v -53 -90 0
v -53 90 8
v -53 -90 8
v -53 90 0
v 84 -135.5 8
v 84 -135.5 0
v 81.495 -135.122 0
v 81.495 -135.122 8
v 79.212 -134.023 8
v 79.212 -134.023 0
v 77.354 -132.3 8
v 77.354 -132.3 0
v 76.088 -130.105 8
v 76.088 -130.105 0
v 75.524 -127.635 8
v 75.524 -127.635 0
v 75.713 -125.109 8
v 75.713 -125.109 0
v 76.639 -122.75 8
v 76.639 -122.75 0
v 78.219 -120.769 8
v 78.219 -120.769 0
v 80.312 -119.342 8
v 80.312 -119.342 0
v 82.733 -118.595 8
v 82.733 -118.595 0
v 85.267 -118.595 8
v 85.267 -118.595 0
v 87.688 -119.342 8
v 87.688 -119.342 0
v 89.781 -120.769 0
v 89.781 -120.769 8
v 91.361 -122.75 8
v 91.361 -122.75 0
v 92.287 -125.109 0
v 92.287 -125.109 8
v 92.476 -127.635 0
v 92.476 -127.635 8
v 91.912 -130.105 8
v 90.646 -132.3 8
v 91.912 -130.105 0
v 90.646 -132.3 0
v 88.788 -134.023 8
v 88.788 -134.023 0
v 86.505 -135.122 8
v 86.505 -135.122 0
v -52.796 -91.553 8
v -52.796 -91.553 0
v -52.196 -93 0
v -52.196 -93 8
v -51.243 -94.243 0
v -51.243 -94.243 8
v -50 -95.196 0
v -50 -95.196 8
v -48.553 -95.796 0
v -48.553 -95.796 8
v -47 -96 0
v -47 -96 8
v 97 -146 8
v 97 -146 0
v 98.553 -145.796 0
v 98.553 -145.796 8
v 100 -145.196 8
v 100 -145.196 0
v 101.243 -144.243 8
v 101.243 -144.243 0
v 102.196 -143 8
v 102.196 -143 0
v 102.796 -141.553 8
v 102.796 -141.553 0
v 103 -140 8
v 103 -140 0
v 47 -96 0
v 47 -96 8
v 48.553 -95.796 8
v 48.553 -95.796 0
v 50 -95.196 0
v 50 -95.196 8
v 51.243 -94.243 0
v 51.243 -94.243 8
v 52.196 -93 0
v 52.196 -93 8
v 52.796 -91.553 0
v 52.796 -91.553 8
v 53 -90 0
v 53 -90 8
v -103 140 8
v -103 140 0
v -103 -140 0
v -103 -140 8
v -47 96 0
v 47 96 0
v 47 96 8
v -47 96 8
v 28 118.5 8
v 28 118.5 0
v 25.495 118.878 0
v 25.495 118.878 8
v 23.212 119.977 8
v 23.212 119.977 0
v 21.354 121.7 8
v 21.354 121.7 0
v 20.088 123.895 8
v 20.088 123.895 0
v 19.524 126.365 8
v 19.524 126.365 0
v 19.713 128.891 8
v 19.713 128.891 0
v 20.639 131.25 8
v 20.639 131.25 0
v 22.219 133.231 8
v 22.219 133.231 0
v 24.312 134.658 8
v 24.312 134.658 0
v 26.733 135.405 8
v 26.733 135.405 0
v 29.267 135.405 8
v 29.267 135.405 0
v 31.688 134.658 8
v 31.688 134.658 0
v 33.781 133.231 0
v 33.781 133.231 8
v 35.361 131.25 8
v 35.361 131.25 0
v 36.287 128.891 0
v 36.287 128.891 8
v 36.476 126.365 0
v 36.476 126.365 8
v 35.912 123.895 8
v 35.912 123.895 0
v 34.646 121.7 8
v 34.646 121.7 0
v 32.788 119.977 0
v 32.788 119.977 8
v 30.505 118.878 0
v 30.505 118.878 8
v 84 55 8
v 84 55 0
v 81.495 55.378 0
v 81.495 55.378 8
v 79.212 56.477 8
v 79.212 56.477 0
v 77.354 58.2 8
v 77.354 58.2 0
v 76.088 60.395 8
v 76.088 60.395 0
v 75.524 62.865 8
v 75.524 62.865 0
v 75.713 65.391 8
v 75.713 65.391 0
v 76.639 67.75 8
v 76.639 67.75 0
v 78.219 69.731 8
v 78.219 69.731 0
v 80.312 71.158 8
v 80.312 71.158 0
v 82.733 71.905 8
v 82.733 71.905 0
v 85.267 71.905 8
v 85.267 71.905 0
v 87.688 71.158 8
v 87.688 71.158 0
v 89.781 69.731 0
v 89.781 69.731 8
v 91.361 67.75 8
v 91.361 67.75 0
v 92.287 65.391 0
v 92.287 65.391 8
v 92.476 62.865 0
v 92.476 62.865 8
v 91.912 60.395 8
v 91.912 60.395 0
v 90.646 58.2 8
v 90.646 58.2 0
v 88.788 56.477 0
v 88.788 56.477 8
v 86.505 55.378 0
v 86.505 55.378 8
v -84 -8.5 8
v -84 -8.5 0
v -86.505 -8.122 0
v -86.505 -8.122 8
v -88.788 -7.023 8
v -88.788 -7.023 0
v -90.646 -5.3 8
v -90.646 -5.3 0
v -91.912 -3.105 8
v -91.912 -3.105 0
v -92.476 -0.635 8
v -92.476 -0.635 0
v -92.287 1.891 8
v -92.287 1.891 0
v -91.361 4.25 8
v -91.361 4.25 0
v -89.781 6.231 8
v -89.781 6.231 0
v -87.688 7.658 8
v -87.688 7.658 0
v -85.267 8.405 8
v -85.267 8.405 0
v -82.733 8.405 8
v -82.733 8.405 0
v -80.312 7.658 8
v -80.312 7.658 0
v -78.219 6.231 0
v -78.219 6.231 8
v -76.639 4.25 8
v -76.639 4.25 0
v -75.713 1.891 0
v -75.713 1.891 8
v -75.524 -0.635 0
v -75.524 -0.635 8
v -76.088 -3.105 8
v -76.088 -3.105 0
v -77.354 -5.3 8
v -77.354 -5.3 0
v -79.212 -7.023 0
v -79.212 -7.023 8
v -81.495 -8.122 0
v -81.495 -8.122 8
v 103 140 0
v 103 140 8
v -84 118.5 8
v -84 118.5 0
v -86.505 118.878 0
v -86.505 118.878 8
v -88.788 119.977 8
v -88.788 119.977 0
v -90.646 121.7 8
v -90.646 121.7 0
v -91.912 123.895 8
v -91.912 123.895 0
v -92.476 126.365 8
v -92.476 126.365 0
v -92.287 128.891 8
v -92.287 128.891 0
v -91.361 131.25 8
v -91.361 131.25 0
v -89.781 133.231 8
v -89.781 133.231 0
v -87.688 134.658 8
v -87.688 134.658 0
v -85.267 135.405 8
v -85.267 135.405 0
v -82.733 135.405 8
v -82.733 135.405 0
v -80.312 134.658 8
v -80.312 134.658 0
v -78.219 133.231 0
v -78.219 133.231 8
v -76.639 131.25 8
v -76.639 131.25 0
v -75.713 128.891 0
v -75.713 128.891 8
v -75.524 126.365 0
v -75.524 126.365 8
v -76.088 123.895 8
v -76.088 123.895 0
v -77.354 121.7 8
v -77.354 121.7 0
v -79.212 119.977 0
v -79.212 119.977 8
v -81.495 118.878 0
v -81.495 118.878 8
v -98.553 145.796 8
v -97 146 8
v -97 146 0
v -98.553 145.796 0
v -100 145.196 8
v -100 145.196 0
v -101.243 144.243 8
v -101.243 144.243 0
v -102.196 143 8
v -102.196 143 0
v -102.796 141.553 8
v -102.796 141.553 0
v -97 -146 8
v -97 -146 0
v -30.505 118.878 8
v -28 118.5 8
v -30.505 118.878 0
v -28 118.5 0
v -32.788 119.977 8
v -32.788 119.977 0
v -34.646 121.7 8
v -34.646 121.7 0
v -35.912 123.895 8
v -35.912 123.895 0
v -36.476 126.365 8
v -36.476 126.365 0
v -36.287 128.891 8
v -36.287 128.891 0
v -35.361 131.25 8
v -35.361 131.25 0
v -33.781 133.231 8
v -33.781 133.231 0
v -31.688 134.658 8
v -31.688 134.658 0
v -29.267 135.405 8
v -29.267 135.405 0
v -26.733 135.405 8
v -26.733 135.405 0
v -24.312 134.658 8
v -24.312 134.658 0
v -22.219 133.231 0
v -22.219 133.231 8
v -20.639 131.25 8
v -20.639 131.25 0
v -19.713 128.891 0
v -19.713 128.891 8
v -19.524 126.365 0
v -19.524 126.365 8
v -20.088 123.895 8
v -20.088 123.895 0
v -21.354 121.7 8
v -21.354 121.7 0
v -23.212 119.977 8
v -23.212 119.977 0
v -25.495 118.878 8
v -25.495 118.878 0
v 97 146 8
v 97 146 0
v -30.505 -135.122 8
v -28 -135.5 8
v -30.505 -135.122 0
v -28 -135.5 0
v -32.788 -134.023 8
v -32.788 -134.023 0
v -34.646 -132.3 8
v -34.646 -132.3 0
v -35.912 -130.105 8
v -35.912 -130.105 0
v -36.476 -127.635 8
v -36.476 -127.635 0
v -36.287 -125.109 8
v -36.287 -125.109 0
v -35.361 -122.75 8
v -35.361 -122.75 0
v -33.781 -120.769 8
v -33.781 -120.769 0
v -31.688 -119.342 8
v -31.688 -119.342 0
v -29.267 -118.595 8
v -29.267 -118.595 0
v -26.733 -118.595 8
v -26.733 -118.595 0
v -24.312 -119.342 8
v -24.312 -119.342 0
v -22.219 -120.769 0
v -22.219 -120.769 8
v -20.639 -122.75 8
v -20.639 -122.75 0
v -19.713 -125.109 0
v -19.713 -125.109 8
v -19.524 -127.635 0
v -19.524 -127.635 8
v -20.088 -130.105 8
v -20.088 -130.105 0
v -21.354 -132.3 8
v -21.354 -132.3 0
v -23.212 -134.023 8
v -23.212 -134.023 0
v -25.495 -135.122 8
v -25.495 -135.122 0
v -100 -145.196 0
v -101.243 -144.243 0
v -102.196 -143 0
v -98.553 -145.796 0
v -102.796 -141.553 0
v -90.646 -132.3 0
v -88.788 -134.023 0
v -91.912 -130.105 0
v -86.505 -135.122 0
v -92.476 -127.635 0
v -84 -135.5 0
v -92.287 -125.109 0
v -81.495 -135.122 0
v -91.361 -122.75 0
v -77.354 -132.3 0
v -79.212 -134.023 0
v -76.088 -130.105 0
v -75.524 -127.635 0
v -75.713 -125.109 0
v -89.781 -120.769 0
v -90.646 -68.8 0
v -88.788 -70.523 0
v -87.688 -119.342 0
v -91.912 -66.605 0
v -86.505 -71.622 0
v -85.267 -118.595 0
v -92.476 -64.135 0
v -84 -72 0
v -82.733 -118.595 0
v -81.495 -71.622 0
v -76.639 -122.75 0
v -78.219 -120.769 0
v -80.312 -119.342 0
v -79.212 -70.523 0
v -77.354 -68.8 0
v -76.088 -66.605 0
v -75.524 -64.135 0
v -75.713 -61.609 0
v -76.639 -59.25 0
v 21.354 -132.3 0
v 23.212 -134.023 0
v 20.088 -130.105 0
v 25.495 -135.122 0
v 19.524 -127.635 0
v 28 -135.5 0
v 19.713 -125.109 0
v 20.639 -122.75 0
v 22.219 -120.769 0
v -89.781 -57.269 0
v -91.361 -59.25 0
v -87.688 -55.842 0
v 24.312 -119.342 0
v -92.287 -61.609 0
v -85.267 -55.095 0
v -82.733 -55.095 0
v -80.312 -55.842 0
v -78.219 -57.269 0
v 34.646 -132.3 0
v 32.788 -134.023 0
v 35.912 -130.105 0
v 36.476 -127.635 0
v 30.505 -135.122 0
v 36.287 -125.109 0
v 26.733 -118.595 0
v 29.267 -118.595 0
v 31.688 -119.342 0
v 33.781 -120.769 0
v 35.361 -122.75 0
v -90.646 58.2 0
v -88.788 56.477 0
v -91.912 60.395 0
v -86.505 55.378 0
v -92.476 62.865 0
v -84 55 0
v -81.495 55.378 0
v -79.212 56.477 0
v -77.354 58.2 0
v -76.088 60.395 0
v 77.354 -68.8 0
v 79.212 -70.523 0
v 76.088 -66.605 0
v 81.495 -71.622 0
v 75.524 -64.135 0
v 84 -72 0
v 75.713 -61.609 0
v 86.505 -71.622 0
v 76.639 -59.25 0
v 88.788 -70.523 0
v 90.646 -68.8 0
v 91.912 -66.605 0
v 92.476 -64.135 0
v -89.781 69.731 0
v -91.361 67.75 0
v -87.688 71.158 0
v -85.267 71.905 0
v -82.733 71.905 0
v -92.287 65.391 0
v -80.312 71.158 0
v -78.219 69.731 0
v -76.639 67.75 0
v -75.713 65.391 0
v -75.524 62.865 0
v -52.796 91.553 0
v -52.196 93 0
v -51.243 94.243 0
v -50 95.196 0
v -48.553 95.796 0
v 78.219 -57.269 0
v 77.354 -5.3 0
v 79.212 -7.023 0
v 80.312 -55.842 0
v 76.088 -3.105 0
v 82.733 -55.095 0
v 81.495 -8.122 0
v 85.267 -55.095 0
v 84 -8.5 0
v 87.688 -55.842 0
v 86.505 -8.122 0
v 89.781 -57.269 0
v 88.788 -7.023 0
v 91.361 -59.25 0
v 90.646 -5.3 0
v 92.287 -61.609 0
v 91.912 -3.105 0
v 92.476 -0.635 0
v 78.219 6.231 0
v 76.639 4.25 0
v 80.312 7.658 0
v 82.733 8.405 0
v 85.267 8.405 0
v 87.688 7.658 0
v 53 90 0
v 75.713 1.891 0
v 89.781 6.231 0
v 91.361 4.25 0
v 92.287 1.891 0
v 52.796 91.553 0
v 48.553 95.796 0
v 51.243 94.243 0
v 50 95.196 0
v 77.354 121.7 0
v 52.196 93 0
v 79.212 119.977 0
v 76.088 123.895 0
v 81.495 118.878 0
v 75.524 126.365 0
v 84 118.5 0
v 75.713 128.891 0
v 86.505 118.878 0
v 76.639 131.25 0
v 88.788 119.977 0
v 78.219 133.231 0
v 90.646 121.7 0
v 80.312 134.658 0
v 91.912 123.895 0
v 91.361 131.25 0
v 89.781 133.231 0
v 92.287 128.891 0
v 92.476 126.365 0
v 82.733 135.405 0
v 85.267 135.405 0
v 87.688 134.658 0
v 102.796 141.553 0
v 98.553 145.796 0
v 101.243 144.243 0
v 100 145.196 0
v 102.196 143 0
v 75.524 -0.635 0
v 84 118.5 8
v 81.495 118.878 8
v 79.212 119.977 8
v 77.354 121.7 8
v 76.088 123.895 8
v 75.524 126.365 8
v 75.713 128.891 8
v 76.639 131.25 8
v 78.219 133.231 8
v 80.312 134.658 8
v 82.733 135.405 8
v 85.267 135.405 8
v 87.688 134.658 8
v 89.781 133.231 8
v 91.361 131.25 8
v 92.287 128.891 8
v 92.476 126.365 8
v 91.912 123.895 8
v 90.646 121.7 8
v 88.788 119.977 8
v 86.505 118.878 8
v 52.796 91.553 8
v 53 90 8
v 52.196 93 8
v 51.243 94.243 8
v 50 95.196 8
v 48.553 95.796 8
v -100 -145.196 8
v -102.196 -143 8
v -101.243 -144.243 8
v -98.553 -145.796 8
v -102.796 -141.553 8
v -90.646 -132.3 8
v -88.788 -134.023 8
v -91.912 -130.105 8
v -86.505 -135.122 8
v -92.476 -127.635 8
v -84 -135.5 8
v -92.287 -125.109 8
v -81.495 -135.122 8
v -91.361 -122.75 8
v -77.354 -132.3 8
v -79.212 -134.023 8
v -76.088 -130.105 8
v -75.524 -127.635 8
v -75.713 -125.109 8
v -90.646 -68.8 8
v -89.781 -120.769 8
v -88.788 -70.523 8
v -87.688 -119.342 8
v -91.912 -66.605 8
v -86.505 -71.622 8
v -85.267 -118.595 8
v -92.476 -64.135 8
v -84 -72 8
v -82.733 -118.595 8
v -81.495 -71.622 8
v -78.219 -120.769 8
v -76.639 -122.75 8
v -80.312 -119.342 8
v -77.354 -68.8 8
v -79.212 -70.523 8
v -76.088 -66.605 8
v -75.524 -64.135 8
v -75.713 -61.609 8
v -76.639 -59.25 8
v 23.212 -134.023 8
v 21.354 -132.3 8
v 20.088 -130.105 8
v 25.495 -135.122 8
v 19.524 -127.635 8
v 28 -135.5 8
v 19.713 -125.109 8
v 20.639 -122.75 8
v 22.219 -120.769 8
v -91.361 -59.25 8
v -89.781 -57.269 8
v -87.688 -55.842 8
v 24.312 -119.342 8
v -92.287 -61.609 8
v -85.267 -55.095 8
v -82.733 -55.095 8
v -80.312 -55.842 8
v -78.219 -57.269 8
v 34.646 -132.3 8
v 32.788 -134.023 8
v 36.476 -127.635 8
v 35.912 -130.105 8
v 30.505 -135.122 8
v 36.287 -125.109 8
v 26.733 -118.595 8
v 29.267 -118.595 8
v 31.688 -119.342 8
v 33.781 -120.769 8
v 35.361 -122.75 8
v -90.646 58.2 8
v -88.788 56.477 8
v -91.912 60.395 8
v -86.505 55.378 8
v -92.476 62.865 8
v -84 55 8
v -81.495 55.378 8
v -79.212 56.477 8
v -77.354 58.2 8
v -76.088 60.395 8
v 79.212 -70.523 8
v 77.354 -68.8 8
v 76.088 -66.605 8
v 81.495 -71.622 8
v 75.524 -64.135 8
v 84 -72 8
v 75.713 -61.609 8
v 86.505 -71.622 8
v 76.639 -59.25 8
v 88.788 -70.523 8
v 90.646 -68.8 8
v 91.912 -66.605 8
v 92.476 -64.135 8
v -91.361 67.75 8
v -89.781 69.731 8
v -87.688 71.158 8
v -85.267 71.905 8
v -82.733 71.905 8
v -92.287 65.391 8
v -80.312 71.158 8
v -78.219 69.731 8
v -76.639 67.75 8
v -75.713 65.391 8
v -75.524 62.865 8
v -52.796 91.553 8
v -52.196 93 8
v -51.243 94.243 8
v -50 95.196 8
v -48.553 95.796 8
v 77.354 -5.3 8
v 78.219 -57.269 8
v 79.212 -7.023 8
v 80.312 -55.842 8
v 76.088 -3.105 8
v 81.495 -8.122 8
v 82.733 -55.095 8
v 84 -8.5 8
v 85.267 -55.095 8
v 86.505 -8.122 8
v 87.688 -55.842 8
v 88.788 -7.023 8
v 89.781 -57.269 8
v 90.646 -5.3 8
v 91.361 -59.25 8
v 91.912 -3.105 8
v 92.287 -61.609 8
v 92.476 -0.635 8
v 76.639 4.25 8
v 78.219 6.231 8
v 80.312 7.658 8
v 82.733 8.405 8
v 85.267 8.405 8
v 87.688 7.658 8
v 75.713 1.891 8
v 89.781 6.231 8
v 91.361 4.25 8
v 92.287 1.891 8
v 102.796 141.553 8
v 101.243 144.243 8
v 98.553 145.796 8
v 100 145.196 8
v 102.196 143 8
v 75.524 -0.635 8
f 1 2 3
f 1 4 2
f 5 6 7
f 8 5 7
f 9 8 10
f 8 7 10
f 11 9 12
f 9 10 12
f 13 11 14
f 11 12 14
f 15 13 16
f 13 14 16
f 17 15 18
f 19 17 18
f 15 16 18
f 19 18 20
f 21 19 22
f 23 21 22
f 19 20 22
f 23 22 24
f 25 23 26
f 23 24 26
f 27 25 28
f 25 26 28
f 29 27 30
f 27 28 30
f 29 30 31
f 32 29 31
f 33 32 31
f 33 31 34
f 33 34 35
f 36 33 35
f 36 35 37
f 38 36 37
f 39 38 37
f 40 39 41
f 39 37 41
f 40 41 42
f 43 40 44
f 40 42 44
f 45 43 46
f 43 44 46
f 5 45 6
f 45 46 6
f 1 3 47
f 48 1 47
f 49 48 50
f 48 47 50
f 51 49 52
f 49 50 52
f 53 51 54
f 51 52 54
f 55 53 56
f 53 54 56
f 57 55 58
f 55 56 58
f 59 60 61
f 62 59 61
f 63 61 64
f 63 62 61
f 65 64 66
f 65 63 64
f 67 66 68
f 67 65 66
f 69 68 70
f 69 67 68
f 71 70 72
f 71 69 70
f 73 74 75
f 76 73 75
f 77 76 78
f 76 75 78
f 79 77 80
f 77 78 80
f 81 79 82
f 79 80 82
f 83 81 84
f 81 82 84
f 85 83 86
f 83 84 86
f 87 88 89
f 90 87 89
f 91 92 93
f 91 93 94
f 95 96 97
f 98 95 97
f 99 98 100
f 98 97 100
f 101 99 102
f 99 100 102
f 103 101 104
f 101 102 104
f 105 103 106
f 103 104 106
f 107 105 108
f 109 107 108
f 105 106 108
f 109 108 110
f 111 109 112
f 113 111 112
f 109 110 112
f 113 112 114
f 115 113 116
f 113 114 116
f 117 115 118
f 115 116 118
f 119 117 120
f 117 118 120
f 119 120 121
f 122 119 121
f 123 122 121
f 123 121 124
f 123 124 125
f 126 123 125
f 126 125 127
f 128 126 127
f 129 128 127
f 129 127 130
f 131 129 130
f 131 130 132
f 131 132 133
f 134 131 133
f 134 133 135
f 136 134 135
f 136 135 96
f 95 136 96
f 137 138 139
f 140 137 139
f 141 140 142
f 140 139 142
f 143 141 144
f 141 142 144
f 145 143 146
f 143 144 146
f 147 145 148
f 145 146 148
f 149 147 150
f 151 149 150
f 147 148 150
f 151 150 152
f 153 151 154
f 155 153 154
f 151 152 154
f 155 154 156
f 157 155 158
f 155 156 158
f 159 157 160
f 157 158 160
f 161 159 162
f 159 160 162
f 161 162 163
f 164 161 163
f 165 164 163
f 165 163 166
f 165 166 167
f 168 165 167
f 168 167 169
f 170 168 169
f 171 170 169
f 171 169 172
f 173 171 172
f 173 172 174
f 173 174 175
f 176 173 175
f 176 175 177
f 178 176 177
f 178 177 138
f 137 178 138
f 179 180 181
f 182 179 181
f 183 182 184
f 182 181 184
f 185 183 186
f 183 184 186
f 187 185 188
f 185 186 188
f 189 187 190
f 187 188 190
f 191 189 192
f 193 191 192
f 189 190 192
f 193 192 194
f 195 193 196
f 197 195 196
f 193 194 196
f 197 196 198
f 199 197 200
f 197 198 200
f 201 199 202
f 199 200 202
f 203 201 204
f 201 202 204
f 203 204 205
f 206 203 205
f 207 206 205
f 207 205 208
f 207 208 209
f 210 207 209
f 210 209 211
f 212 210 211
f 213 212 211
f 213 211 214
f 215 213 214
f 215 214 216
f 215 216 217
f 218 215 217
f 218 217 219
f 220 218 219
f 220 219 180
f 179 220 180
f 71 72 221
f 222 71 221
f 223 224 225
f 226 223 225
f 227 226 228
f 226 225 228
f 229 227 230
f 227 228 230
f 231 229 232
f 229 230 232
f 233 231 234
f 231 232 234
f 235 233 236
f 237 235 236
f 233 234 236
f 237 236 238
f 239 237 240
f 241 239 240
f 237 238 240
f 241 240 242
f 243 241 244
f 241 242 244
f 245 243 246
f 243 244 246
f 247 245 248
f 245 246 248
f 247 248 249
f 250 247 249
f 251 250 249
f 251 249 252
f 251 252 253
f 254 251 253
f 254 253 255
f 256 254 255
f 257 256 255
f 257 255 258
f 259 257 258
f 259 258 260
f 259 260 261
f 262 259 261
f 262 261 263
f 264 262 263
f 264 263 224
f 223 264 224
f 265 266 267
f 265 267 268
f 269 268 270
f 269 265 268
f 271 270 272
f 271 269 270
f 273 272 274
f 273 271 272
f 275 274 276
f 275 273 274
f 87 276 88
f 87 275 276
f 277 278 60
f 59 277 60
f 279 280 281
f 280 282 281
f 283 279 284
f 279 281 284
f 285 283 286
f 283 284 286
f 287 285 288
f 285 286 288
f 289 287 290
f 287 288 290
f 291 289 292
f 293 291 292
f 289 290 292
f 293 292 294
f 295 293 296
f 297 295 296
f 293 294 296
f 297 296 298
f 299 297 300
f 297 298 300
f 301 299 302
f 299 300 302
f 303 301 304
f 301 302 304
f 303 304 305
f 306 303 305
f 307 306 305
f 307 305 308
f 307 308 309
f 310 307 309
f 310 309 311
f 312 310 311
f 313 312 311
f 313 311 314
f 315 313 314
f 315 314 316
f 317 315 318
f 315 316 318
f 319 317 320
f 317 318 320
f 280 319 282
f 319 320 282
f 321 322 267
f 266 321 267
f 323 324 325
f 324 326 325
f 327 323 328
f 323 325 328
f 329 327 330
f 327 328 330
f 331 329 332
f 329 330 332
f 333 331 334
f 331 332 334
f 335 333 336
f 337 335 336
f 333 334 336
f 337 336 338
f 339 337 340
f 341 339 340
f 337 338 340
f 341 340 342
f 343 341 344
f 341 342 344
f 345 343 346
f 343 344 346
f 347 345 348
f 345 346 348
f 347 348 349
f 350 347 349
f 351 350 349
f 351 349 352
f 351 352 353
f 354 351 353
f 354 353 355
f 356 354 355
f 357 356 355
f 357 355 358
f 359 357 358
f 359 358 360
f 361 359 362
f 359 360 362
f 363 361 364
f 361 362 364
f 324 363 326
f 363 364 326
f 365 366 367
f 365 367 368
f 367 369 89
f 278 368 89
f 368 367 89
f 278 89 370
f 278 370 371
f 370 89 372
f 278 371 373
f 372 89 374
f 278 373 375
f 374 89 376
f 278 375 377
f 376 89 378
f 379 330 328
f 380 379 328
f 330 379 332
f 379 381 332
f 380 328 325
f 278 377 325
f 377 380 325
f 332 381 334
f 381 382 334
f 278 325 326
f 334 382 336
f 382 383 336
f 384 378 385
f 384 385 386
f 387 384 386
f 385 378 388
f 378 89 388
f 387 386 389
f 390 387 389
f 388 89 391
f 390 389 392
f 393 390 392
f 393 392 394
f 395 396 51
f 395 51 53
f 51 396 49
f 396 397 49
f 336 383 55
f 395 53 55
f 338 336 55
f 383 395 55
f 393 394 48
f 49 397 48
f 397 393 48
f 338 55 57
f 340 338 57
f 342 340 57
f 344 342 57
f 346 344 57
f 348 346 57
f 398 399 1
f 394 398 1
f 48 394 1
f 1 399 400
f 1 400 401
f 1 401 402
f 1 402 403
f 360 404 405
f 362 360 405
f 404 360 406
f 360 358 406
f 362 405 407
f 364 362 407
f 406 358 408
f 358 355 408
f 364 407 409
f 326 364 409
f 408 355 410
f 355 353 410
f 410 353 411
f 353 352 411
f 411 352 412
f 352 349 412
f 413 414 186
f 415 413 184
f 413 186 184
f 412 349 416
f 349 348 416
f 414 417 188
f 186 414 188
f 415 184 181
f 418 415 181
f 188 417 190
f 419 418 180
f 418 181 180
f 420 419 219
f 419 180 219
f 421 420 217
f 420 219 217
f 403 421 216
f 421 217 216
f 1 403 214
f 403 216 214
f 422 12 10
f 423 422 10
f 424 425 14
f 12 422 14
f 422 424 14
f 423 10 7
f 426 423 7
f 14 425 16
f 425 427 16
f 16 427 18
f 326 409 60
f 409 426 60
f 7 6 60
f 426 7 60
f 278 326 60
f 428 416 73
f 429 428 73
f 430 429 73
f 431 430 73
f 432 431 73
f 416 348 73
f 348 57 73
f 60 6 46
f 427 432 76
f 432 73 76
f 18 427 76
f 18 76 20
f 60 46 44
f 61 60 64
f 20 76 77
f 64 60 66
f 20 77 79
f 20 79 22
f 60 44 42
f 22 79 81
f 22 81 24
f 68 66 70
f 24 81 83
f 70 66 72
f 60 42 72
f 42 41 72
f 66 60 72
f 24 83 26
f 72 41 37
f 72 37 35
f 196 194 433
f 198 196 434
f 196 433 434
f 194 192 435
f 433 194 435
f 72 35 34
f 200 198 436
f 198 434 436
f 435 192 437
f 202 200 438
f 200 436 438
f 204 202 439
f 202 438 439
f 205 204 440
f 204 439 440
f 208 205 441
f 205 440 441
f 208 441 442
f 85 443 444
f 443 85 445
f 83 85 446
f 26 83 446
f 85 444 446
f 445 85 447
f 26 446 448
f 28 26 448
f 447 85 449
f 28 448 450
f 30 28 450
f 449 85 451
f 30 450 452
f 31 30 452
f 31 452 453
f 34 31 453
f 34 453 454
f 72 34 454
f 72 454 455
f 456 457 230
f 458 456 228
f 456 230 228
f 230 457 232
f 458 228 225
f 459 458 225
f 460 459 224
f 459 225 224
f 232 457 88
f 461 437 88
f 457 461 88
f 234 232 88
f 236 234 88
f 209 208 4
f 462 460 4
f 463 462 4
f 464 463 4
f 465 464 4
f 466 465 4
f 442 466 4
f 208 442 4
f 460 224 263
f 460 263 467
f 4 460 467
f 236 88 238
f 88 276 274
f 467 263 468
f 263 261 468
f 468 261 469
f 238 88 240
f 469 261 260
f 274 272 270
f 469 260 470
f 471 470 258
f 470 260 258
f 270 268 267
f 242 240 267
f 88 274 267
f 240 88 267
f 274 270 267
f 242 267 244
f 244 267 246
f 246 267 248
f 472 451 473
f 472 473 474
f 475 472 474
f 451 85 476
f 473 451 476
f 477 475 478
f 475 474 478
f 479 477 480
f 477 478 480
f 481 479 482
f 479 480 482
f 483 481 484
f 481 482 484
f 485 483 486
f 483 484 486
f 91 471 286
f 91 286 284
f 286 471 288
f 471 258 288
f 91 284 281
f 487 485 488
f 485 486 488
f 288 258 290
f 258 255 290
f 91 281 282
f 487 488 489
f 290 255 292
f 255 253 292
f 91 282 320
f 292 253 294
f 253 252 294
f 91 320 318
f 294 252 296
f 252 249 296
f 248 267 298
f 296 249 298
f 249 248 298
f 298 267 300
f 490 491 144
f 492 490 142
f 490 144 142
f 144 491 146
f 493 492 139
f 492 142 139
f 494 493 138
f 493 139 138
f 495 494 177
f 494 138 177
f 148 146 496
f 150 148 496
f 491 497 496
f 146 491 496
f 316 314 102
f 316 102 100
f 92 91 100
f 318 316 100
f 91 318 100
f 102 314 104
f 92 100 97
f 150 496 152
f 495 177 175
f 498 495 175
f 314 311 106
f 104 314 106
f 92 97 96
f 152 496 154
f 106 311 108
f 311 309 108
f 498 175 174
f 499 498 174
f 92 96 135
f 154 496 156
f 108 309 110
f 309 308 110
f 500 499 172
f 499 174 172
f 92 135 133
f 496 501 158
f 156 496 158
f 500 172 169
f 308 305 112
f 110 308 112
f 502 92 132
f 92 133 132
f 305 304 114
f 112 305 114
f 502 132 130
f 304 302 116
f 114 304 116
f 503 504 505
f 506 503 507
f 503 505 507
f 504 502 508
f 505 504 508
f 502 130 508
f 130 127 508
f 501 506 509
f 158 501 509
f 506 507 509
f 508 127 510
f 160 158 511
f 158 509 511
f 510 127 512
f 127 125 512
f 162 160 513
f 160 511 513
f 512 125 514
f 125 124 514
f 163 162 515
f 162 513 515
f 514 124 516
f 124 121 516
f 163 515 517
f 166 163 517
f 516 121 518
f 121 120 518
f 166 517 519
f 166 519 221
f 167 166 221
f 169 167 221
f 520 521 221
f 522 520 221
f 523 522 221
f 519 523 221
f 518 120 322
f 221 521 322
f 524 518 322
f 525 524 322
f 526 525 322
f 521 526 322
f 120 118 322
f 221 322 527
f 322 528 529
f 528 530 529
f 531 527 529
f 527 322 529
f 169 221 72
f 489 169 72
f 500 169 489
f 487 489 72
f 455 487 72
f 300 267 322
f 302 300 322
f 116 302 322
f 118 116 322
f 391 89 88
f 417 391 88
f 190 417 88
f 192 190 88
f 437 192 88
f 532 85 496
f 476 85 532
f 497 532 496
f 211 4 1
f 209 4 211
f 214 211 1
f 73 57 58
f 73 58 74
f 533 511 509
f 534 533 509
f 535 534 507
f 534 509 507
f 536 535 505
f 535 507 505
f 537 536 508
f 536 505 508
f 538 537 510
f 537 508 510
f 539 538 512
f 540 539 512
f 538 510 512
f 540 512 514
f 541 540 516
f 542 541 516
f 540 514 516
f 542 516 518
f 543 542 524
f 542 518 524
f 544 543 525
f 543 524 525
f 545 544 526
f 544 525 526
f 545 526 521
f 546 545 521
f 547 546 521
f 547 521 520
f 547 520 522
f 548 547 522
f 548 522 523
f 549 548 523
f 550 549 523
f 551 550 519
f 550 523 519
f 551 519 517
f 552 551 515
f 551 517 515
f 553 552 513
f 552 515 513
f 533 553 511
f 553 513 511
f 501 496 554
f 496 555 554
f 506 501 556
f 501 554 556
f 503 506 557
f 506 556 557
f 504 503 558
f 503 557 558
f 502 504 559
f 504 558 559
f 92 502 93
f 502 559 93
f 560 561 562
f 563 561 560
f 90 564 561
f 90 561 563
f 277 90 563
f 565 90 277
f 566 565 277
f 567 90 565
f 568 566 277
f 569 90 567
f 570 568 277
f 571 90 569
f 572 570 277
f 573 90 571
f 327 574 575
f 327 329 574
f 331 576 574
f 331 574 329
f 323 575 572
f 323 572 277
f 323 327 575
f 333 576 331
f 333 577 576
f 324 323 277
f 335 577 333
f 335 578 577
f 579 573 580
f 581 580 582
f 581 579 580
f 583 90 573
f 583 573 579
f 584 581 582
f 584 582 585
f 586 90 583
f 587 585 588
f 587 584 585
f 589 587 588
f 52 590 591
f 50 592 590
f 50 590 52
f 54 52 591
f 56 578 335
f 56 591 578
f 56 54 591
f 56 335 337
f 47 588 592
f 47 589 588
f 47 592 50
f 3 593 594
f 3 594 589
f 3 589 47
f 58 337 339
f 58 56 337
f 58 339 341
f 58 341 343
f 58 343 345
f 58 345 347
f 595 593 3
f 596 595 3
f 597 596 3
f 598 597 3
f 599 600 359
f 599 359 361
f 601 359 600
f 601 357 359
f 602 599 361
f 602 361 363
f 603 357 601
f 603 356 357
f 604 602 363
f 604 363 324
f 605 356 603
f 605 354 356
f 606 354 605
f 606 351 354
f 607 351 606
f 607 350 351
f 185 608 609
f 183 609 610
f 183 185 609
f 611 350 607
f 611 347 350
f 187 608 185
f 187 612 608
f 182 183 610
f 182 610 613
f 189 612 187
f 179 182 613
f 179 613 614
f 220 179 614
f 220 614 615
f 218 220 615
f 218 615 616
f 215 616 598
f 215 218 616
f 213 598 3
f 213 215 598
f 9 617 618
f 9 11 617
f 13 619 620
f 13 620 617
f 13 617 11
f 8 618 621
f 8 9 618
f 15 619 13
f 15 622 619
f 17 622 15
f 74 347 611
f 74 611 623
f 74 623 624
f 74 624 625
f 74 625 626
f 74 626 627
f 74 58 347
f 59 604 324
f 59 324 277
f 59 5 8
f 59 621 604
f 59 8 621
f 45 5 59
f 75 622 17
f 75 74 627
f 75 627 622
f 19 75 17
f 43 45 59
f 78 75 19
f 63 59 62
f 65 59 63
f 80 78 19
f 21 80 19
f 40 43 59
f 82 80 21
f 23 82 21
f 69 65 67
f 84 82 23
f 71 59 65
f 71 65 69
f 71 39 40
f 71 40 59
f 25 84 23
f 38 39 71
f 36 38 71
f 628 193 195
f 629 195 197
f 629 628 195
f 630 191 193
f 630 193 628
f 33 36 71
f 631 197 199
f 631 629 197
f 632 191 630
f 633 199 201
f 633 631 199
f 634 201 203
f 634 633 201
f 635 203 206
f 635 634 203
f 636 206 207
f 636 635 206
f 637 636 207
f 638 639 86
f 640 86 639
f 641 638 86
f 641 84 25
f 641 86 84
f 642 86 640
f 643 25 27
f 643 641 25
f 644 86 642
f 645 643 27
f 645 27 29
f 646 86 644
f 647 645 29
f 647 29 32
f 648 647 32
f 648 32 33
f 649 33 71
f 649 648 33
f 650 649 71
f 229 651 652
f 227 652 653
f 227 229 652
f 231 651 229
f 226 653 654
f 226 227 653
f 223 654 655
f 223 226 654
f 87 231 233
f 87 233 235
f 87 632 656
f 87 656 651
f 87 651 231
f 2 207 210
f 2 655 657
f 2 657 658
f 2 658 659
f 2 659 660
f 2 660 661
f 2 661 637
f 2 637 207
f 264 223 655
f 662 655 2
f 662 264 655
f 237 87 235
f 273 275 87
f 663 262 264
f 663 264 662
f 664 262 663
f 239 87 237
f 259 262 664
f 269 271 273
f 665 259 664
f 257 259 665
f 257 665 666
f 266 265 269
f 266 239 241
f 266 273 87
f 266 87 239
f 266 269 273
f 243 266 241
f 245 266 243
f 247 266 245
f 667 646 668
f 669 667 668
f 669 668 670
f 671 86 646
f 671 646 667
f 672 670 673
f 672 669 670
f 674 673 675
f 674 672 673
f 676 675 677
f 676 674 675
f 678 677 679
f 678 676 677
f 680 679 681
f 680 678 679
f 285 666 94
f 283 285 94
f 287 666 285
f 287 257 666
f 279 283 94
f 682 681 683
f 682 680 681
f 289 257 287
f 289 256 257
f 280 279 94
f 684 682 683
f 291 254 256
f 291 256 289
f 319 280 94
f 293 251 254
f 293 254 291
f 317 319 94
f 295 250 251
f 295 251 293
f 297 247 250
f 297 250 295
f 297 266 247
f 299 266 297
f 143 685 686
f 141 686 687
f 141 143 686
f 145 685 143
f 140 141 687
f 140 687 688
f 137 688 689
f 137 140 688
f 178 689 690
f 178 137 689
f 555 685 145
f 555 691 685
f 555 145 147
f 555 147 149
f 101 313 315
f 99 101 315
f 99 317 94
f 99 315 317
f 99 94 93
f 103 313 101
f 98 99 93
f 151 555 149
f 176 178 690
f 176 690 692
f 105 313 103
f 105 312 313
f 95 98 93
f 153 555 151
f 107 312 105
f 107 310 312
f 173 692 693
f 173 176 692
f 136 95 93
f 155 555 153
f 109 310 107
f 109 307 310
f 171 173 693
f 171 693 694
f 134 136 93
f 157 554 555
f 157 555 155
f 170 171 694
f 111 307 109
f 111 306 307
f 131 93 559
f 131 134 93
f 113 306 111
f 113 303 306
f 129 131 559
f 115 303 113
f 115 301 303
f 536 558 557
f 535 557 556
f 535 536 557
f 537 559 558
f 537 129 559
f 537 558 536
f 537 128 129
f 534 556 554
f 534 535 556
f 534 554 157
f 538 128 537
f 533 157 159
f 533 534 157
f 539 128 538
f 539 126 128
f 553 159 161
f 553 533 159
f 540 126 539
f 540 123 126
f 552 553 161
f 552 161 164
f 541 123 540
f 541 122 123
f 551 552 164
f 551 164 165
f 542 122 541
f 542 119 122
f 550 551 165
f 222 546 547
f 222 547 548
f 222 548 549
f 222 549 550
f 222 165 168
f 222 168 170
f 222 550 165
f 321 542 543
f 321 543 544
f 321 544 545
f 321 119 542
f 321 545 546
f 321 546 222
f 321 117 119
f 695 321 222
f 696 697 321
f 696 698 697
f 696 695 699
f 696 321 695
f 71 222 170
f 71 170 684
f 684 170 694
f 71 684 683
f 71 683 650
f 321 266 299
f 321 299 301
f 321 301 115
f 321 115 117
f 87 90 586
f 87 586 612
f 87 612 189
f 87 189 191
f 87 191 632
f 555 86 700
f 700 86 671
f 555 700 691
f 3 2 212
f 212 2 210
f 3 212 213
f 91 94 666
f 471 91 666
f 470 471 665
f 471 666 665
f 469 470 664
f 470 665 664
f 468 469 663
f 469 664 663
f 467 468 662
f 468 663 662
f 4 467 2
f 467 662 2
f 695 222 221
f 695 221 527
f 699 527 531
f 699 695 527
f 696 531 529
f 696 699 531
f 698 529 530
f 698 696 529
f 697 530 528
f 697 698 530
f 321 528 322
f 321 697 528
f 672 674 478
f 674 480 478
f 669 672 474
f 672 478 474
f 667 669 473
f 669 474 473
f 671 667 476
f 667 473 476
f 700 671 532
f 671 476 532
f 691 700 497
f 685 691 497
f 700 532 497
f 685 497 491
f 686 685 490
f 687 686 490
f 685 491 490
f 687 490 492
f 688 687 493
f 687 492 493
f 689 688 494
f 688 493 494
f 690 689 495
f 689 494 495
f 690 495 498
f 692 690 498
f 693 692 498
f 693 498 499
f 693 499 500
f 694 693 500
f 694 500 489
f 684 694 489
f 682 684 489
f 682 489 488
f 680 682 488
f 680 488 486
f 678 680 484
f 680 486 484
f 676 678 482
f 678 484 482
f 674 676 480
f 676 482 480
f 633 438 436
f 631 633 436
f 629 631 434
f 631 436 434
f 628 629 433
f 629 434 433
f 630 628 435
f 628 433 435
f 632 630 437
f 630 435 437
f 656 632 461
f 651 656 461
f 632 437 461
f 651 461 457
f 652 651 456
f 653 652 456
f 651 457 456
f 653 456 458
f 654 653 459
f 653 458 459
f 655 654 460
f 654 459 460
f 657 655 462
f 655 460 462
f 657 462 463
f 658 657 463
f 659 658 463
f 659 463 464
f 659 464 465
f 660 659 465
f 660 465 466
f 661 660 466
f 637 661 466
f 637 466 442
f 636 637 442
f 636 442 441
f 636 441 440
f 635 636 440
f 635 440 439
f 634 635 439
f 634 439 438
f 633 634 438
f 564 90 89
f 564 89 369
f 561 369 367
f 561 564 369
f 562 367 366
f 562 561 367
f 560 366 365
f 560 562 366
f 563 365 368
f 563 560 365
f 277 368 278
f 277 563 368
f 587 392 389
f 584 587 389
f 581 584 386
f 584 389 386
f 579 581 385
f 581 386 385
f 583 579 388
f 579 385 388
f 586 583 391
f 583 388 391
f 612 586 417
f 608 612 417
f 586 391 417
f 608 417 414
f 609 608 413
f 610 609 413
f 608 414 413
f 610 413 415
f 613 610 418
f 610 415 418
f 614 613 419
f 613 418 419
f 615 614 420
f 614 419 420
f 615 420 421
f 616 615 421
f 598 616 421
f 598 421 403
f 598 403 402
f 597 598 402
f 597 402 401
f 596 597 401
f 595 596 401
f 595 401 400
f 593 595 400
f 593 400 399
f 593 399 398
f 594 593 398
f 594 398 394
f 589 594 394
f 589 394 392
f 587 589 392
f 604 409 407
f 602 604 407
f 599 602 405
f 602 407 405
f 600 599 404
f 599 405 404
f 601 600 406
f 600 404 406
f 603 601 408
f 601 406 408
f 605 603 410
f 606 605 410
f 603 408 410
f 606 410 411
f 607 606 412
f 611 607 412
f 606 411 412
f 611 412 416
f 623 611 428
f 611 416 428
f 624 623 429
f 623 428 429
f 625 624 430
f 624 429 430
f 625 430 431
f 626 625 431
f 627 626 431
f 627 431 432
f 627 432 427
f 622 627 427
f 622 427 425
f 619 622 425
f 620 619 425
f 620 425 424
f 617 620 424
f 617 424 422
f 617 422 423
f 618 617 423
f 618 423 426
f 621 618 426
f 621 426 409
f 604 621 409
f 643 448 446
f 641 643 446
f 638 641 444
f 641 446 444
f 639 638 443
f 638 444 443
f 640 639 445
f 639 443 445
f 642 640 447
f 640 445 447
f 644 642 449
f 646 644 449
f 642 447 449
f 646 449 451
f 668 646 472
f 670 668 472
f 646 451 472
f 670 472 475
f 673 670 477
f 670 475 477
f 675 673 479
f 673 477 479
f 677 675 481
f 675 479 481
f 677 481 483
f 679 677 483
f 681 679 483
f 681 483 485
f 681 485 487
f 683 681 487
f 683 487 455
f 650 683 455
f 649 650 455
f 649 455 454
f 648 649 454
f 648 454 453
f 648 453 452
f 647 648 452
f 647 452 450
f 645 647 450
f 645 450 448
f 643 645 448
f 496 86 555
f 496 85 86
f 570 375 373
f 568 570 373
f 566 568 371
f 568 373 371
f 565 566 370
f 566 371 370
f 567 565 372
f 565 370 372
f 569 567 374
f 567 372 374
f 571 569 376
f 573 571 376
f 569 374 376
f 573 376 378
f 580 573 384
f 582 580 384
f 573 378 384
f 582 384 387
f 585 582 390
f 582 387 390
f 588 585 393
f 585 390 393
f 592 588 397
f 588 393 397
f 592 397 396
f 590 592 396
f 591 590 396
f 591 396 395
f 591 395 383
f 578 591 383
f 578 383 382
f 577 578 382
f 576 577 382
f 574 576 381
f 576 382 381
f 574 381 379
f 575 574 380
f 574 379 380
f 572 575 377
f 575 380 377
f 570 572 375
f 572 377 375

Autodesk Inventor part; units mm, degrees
ref_plane "YZ Plane" through (0, 0, 0) normal (1, 0, 0) x (0, 1, 0)
ref_plane "XZ Plane" through (0, 0, 0) normal (0, 1, 0) x (-1, 0, 0)
ref_plane "XY Plane" through (0, 0, 0) normal (0, 0, 1) x (1, 0, 0)
sketch "Sketch2" plane through (0, 0, 0) normal (0, 0, 1) x (1, 0, 0)
  line L0 (-53, -96) -> (53, -96)
  line L1 (53, -96) -> (53, 96)
  line L2 (53, 96) -> (-53, 96)
  line L3 (-53, 96) -> (-53, -96)
  line L4 (-53, -96) -> (53, 96) construction
  line L5 (53, -96) -> (-53, 96) construction
  line L6 (-103, -146) -> (103, -146)
  line L7 (103, -146) -> (103, 146)
  line L8 (103, 146) -> (-103, 146)
  line L9 (-103, 146) -> (-103, -146)
  point P0 (0, 0)
  dimension "d29" = 106
  dimension "d30" = 192
  dimension "d31" = 50
extrude "Plate2" add sketch "Sketch2" along normal blind 8
sketch "Sketch5" plane through (0, 0, 8) normal (0, 0, 1) x (1, 0, 0)
  line L0 (53, 96) -> (53, -96) construction
  line L1 (53, -96) -> (-53, -96) construction
  line L2 (-53, -96) -> (-53, 96) construction
  line L3 (-53, 96) -> (53, 96) construction
  line L4 (103, -146) -> (-103, -146) construction
  line L5 (103, 146) -> (103, -146) construction
  line L6 (-103, 146) -> (103, 146) construction
  line L7 (-103, -146) -> (-103, 146) construction
  line L8 (-84, 127) -> (84, 127) construction
  line L9 (84, 127) -> (84, -127) construction
  line L10 (84, -127) -> (-84, -127) construction
  line L11 (-84, -127) -> (-84, 127) construction
  line L12 (-53, 0) -> (53, 0) construction
  line L13 (0, 96) -> (0, -96)
  point P0 (0, 0)
  point P1 (0, -127)
  point P2 (-84, 63.5)
  point P3 (-84, 0)
  point P4 (-84, -63.5)
  point P5 (-28, -127)
  point P6 (28, -127)
  point P7 (84, -63.5)
  point P8 (84, 0)
  point P9 (84, 63.5)
  point P10 (28, 127)
  point P11 (-28, 127)
  dimension "d34" = 19
  dimension "d49" = 63.5
  dimension "d50" = 63.5
  dimension "d51" = 56
  dimension "d52" = 56
  dimension "d53" = 56
fillet "Corner Round1" radius 6 8 edges at (-103, -146, 4) (-103, 146, 4) (103, 146, 4) (103, -146, 4) (53, -96, 4) (-53, -96, 4) (-53, 96, 4) (53, 96, 4)
hole "Hole1" at (-84, 127, 8) at (-84, 63.5, 8) at (-84, 0, 8) at (-84, -63.5, 8) at (-84, -127, 8) at (-28, -127, 8) at (28, -127, 8) at (84, -127, 8) at (84, -63.5, 8) at (84, 0, 8) at (84, 63.5, 8) at (84, 127, 8) at (28, 127, 8) at (-28, 127, 8) direction (0, 0, -1) diameter 17 end through all
equation "\"d49\" = d50"
equation "\"d51\" = d53"
equation "\"d52\" = d53"
equation "\"d29\" = ChargingHatch_hight - 2 * Thickness"
equation "\"d30\" = ChargingHatch_width - 2 * Thickness"
equation "\"d59\" = Thickness"
equation "\"d14\" = Thickness"
equation "\"BendReliefWidth\" = Thickness"
equation "\"BendReliefDepth\" = 0.5 * Thickness"
equation "\"CornerReliefSize\" = 4 * Thickness"
equation "\"MinimumRemnant\" = 2 * Thickness"
equation "\"TransitionRadius\" = BendRadius"
equation "\"JacobiRadiusSize\" = BendRadius"
equation "\"GapSize\" = Thickness"
equation "\"ChargingHatch_hight\" = 122"
equation "\"Thickness\" = 8"
equation "\"ChargingHatch_width\" = 208"
equation "\"BendRadius\" = 6"
properties part number "PRS 9606 charging flange round_D1200 940" material "Steel"
